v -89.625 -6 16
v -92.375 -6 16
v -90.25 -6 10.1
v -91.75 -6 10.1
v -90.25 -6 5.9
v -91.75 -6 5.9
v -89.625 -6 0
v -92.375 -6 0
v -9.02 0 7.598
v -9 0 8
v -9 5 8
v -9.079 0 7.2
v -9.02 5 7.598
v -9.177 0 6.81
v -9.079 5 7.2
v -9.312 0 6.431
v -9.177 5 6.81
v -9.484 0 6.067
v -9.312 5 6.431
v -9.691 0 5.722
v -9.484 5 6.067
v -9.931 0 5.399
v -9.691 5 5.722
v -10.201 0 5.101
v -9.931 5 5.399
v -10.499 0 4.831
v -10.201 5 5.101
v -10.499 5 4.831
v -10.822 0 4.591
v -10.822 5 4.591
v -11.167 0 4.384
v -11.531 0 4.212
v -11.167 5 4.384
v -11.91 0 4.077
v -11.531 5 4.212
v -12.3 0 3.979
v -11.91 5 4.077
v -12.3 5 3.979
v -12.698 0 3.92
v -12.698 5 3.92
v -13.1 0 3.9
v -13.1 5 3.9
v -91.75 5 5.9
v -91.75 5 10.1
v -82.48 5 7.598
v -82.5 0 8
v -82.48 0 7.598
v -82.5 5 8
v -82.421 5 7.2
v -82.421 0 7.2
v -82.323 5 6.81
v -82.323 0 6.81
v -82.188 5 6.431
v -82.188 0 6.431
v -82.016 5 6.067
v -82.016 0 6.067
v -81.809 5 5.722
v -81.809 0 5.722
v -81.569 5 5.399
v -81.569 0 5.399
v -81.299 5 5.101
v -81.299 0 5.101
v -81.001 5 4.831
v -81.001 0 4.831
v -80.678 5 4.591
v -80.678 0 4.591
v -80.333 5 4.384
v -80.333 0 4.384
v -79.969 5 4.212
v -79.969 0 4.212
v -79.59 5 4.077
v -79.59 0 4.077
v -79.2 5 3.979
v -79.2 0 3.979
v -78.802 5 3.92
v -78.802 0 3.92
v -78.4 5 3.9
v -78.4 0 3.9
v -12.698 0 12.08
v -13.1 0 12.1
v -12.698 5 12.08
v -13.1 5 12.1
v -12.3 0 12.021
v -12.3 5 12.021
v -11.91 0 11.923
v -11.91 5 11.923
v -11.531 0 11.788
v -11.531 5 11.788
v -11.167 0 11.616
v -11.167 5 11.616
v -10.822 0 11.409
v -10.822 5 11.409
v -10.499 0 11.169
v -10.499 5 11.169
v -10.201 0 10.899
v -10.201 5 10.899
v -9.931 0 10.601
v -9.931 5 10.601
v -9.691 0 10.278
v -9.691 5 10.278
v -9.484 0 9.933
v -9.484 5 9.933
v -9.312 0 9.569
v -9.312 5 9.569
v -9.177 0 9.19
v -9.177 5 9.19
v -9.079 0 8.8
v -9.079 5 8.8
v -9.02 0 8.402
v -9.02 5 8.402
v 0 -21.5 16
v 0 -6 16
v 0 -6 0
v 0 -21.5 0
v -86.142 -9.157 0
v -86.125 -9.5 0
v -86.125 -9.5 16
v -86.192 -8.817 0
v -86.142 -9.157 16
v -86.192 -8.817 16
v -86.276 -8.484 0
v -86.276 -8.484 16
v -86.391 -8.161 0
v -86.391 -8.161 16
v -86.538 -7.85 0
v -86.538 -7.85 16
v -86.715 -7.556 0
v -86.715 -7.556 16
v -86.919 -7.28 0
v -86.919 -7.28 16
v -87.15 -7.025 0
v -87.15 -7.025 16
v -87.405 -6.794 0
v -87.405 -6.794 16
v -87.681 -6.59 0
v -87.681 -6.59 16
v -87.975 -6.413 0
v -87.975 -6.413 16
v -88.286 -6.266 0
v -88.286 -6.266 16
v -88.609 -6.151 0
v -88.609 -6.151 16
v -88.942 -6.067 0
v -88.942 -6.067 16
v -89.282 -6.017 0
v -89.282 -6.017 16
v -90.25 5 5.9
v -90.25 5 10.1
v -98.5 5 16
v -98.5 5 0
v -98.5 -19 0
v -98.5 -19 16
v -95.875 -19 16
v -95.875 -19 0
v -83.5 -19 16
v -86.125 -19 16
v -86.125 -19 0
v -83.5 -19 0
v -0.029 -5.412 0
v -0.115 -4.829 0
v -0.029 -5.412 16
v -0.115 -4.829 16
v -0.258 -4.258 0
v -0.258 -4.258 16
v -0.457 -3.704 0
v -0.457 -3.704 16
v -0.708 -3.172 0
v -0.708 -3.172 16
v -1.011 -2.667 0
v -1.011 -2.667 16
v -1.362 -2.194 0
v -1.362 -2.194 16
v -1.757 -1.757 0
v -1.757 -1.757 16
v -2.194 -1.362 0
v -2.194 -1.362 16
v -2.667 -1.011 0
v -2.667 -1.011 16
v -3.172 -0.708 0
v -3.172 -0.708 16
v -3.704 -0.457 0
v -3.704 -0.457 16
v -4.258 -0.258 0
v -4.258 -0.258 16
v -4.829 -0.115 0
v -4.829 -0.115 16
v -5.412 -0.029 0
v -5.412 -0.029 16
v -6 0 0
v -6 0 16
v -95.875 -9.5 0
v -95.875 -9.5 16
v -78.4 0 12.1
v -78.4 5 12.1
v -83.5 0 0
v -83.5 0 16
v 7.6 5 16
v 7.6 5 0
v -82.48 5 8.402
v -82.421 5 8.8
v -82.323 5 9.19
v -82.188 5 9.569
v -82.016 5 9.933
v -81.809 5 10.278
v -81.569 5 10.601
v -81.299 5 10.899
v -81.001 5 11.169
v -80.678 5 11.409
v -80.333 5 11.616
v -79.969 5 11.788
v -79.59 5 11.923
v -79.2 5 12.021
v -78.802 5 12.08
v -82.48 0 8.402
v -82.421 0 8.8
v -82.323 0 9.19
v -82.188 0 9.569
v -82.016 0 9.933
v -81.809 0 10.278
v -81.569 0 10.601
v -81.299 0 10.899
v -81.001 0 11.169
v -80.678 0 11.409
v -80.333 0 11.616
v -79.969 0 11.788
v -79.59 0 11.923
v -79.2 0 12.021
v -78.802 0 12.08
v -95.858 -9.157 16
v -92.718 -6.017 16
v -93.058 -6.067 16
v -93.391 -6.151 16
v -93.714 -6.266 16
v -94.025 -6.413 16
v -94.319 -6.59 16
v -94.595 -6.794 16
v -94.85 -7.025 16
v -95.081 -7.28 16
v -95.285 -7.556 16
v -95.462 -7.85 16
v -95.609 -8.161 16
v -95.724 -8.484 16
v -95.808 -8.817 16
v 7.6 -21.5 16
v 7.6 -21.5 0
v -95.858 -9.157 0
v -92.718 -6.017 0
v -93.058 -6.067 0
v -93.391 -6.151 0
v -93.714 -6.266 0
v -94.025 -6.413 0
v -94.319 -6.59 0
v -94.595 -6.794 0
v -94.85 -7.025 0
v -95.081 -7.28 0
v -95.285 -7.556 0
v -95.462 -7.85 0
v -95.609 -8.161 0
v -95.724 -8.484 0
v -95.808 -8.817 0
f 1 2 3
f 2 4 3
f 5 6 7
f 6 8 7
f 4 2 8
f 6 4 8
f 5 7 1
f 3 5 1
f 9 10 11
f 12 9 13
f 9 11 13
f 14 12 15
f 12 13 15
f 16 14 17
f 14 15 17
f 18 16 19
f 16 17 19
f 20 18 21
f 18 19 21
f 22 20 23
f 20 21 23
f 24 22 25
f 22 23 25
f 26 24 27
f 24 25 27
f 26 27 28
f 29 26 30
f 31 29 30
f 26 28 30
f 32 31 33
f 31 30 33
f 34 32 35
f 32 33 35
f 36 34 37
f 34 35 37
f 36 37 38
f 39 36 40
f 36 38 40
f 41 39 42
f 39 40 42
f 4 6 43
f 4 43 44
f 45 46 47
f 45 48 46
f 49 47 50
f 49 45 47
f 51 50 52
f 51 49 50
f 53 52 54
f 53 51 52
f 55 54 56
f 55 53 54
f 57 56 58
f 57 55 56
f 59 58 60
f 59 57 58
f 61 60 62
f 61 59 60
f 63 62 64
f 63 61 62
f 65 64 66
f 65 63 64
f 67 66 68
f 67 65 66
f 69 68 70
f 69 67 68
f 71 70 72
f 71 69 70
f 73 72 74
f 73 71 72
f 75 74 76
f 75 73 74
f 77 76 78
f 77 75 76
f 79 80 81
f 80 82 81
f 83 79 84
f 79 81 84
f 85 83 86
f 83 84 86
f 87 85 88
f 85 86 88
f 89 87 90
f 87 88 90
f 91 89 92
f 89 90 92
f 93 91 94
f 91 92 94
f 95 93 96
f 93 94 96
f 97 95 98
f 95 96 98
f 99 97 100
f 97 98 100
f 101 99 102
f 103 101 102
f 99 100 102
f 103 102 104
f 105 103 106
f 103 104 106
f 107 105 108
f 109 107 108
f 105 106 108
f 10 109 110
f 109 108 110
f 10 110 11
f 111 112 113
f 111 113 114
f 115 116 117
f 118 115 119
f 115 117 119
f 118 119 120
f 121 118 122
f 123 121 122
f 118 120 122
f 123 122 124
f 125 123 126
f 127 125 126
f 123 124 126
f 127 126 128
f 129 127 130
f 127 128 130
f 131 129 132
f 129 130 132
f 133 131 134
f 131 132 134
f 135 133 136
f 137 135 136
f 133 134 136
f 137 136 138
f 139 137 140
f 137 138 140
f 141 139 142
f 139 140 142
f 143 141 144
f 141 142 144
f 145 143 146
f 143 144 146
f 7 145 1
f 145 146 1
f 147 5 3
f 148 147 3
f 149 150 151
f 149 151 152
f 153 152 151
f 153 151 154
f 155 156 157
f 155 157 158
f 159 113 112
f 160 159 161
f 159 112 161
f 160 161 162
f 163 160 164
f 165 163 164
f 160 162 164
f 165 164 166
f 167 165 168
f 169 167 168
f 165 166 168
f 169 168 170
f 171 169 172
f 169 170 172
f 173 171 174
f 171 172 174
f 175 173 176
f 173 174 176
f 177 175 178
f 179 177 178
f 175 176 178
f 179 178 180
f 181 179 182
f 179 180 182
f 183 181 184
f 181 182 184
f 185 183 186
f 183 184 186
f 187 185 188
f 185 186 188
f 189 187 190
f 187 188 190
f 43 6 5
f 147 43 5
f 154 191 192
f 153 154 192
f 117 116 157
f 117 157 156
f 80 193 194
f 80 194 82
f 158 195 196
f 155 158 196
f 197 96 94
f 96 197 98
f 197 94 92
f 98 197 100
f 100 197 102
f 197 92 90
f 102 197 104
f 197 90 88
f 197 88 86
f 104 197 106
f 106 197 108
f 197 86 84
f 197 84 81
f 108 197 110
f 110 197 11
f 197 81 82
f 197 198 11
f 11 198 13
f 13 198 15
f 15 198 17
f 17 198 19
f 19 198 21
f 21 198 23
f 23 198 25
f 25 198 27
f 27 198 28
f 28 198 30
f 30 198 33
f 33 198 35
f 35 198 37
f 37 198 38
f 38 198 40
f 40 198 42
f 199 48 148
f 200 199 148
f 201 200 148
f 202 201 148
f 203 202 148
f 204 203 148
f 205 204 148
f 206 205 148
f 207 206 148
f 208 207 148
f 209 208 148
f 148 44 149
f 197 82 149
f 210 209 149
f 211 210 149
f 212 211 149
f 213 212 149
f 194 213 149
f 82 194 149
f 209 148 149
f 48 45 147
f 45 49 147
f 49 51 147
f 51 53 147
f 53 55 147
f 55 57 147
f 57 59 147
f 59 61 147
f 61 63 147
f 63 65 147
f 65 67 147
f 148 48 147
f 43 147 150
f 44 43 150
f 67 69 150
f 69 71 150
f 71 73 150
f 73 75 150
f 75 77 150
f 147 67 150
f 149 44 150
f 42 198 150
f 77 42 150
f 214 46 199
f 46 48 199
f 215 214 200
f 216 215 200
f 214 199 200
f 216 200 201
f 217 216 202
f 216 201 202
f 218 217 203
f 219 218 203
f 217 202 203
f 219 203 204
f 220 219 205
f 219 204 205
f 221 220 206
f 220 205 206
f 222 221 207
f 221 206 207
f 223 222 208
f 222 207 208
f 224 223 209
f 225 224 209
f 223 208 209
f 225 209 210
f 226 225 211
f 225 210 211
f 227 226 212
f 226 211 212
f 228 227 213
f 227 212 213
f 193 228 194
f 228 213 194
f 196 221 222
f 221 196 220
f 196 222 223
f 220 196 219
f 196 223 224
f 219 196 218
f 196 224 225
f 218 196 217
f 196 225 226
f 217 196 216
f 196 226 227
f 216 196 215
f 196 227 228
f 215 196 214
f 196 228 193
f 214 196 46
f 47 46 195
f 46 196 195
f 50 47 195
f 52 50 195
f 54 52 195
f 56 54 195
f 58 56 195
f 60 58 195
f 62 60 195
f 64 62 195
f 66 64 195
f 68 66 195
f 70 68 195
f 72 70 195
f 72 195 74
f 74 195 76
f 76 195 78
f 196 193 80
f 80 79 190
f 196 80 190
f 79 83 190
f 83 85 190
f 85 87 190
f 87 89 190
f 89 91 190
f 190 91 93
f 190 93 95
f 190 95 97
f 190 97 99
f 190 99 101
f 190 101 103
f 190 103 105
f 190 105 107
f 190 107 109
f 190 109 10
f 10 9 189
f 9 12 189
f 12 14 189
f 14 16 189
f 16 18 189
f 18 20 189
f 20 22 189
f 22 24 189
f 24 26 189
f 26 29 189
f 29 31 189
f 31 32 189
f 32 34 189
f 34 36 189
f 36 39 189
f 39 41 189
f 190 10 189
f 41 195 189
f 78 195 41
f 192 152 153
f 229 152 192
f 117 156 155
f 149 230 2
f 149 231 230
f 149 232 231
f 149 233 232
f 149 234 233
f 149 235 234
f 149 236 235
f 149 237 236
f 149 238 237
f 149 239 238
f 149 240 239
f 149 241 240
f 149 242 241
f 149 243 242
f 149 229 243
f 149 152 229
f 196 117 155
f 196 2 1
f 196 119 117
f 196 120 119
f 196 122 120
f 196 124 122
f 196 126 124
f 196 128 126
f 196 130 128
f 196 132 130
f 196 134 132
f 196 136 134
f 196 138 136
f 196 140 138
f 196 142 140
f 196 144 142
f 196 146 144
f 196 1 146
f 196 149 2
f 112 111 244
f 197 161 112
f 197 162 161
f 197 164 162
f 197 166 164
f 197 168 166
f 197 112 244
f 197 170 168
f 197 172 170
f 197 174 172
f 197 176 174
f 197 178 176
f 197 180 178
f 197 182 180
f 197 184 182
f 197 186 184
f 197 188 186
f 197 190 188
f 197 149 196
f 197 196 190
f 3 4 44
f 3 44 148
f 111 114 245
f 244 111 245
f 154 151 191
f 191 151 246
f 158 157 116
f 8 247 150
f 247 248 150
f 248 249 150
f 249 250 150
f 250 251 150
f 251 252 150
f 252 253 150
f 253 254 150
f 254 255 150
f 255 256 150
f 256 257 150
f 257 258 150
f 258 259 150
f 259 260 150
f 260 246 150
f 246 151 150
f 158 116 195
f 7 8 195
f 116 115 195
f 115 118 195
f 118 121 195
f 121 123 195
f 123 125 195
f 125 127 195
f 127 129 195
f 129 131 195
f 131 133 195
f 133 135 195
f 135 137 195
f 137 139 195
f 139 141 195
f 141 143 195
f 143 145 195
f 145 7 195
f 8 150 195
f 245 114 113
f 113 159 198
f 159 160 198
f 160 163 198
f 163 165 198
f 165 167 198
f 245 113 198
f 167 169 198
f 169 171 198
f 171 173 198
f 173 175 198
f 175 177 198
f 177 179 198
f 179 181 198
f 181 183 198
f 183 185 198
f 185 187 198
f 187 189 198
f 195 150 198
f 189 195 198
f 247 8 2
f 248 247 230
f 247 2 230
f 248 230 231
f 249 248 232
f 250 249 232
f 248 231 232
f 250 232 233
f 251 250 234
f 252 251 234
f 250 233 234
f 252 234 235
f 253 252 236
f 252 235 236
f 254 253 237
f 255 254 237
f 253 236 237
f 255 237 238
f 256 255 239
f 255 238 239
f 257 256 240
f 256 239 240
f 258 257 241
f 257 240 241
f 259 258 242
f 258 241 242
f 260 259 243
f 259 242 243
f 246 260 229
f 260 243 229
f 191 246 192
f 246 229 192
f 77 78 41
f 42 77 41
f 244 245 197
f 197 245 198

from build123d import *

# Parameters (mm, degrees)
EXTRUDE_1_DEPTH     = 16
SKETCH_4_W          = 1.5
SKETCH_4_H          = 4.2
SKETCH_4_W_2        = 73.5
SKETCH_4_H_2        = 8.2
CUT_EXTRUDE_1_DEPTH = 10
FILLET_1_R          = 4.1
SKETCH_6_W          = 10
SKETCH_6_H          = 16
SKETCH_6_W_2        = 1.5
SKETCH_6_H_2        = 4.2
EXTRUDE_4_DEPTH     = 11
EXTRUDE_START       = -11
SKETCH_10_W         = 0.125
SKETCH_10_H         = 16
SKETCH_10_W_2       = 2.5
EXTRUDE_6_DEPTH     = 24
FILLET_2_R          = 3.5
FILLET_3_R          = 6


with BuildPart() as part:
    # 스케치1 → 보스-돌출1 (new body)
    with BuildSketch(Plane.XY):
        Polygon((-96, 0), (0, 0), (0, -21.5), (7.6, -21.5), (7.6, 5), (-96, 5), align=None)
    extrude(amount=EXTRUDE_1_DEPTH)

    # 스케치4 → 컷-돌출1 (cut)
    with BuildSketch(Plane.XZ):
        with Locations((-91, 8)):
            Rectangle(SKETCH_4_W, SKETCH_4_H)
        with Locations((-45.75, 8)):
            Rectangle(SKETCH_4_W_2, SKETCH_4_H_2)
    extrude(amount=-CUT_EXTRUDE_1_DEPTH, mode=Mode.SUBTRACT)

    # 필렛1
    fillet_1_edges = [part.edges().sort_by_distance(p)[0] for p in [
        (-82.5, 2.5, 3.9),
        (-82.5, 2.5, 12.1),
        (-9, 2.5, 3.9),
        (-9, 2.5, 12.1),
    ]]
    fillet(fillet_1_edges, radius=FILLET_1_R - 0.0001)  # a hair under: the kernel refuses the full size

    # 스케치6 → 보스-돌출4 (add)
    with BuildSketch(Plane(origin=(0, 5, 0), x_dir=(1, 0, 0), z_dir=(0, 1, 0))):
        with Locations((-91, -8)):
            Rectangle(SKETCH_6_W, SKETCH_6_H)
        with Locations((-91, -8)):
            Rectangle(SKETCH_6_W_2, SKETCH_6_H_2, mode=Mode.SUBTRACT)
    extrude(amount=-EXTRUDE_4_DEPTH)

    # 스케치10 → 보스-돌출6 (add)
    with BuildSketch(Plane.XZ.offset(6).offset(EXTRUDE_START)):
        with Locations((-95.9375, 8)):
            Rectangle(SKETCH_10_W, SKETCH_10_H)
        with Locations((-97.25, 8)):
            Rectangle(SKETCH_10_W_2, SKETCH_10_H)
        with Locations((-86.0625, 8)):
            Rectangle(SKETCH_10_W, SKETCH_10_H)
        with Locations((-84.75, 8)):
            Rectangle(SKETCH_10_W_2, SKETCH_10_H)
    extrude(amount=EXTRUDE_6_DEPTH)

    # 필렛2
    fillet_2_edges = [part.edges().sort_by_distance(p)[0] for p in [
        (-95.875, -6, 8),
        (-86.125, -6, 8),
    ]]
    fillet(fillet_2_edges, radius=FILLET_2_R)

    # 필렛3
    fillet_3_edges = [part.edges().sort_by_distance(p)[0] for p in [
        (0, 0, 8),
    ]]
    fillet(fillet_3_edges, radius=FILLET_3_R)


solid = part.part
